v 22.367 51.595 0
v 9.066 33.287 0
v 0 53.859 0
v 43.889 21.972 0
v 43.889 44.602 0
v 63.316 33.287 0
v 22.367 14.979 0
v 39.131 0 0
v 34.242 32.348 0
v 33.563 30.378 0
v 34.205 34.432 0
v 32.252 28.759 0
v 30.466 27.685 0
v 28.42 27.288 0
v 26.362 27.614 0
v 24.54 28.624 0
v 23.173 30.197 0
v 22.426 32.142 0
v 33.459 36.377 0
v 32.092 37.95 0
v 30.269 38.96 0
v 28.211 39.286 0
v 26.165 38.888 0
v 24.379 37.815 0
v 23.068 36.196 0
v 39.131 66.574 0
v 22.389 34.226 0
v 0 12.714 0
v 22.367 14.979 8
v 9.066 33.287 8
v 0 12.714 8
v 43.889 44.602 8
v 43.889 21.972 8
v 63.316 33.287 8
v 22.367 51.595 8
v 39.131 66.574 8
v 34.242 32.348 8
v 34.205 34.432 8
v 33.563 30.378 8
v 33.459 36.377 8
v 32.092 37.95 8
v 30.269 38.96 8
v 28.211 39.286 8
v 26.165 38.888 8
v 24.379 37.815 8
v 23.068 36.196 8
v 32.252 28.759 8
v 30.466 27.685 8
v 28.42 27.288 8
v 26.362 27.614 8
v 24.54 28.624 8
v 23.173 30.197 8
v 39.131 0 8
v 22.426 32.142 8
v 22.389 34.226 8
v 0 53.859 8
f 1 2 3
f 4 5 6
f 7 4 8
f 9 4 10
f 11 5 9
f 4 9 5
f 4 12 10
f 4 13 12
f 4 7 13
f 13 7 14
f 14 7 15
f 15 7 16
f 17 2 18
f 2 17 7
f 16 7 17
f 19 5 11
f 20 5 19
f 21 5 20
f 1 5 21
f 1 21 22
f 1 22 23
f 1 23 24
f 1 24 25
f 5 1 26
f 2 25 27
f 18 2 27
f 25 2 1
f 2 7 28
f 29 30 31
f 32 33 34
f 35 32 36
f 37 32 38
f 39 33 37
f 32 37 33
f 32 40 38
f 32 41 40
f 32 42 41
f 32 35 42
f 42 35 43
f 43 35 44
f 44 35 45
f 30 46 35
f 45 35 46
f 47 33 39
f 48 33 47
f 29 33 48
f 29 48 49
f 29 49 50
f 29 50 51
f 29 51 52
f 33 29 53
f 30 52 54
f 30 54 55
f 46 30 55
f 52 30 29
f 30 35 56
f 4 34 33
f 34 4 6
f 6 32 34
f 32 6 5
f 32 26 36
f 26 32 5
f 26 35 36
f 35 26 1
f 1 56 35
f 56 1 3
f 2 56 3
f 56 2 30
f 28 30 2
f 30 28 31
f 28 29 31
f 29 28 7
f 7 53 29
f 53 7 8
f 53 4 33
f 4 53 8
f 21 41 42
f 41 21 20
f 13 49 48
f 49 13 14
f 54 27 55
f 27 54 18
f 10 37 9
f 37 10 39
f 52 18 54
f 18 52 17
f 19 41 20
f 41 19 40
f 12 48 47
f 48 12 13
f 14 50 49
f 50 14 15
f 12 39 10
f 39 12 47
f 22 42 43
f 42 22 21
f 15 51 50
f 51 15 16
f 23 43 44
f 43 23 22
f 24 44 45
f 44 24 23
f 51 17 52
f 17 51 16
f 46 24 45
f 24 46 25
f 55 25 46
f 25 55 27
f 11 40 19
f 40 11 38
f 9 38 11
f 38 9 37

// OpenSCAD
$fn = 32;

// ----------------------------------------------------------------------
// Star wheel: 5-point star, R35
// ----------------------------------------------------------------------

// --- parameters (mm) ---
n_points = 5;             // number of points / teeth
r_out = 35;               // tip radius
r_in = 19.25;             // root radius
bore_r = 6;               // centre bore radius
plate_t = 8;              // plate thickness, Z (extrusion height)
bore_d = 12;              // centre bore diameter

profile = [[63.316, 33.287], [43.889, 44.602], [39.131, 66.574], [22.367, 51.595], [0, 53.859], [9.066, 33.287], [0, 12.714], [22.367, 14.979], [39.131, 0], [43.889, 21.972]];  // primary outline, 10 points, counter clockwise
void_1 = [[34.205, 34.432], [33.459, 36.377], [32.092, 37.95], [30.269, 38.96], [28.211, 39.286], [26.165, 38.888], [24.379, 37.815], [23.068, 36.196], [22.389, 34.226], [22.426, 32.142], [23.173, 30.197], [24.54, 28.624], [26.362, 27.614], [28.42, 27.288], [30.466, 27.685], [32.252, 28.759], [33.563, 30.378], [34.242, 32.348]];  // centre bore, 18 points

// --- the one profile operation ---
difference() {
  linear_extrude(height = plate_t) polygon(points = profile);
  translate([0, 0, -1])
    linear_extrude(height = plate_t + 2) polygon(points = void_1);
}
